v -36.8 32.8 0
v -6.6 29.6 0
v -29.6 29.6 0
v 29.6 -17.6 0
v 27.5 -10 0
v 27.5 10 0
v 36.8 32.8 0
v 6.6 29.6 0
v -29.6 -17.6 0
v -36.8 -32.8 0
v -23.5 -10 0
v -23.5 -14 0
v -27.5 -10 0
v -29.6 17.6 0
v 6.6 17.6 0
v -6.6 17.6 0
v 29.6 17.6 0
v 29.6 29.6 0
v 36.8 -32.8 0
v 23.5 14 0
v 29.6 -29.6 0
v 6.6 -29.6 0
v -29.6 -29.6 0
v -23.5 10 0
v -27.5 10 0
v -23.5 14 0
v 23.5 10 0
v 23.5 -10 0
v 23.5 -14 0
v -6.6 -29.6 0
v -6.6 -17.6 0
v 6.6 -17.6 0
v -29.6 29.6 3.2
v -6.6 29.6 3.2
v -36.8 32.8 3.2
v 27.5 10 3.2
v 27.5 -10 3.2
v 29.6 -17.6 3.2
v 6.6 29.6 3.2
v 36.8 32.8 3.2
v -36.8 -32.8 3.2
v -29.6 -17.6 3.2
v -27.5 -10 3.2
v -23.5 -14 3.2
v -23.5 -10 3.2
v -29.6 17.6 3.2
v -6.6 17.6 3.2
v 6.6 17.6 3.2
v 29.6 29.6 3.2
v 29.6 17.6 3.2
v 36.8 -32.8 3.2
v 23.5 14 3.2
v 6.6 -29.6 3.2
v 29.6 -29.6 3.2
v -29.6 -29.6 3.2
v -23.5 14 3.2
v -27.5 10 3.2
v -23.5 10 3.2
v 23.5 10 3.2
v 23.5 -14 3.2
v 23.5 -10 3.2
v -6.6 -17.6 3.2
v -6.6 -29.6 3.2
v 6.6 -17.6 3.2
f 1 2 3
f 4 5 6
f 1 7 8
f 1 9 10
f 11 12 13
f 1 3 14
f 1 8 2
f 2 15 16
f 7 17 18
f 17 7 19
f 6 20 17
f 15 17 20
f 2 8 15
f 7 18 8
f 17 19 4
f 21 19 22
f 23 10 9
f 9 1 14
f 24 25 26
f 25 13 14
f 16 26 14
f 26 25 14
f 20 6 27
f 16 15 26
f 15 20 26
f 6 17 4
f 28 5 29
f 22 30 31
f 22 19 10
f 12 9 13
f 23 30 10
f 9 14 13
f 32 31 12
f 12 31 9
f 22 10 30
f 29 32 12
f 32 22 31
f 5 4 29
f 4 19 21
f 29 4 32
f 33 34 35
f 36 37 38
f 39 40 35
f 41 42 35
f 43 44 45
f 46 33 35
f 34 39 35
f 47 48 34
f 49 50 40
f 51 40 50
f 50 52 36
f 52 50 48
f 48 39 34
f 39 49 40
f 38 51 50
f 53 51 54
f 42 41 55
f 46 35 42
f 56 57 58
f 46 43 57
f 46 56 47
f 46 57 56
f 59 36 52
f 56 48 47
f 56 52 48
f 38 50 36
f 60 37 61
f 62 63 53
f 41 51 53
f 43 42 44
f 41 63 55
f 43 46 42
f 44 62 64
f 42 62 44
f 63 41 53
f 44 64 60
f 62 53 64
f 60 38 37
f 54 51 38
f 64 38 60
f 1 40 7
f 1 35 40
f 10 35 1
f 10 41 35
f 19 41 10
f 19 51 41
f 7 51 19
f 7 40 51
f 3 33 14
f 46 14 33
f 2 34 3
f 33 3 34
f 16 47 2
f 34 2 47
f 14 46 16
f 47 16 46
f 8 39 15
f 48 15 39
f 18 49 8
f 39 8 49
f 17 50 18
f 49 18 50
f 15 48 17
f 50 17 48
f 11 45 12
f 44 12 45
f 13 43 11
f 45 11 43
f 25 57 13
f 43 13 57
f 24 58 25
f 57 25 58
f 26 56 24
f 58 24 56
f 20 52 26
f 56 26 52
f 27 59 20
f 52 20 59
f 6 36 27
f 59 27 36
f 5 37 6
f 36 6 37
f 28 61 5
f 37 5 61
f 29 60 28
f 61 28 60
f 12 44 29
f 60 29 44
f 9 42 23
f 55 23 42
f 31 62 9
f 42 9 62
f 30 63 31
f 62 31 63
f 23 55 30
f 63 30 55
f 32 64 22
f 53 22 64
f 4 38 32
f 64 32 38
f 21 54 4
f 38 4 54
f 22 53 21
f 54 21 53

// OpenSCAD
// TODO d1 and d2 tangent work properly

$fn=32;

servo_arm_d = 8;
servo_arm_len = 20;
servo_double_arm_len = 36;

servo_len = 23;
servo_width = 12;
servo_bolt_d = 3;
servo_bolt_offset=3;

servo_center_short = 10;
servo_center_long  = 22;

width=3.2;

meat = 2.0;

border_size = 3.2;

b2_len = 150;
b2_d1 = max(30, 2*(servo_center_short+border_size) + 2);
b2_d2 = 20;

b1_len = 150;
b1_d1 = 30;
b1_d2 = b2_d1;

b0_width = servo_center_short + servo_center_long + 3;

b0_support_len = 10;

esp_len = 55;
esp_width = 28;
esp_bolt_d = 3;

function bone_tangents(l, diams) = let (r1 = diams[0]/2, r2 = diams[1]/2, th = acos((r1-r2) / l)) [
    [-l/2 + r1 * cos(th), -r1 * sin(th)],
    [-l/2 + r1 * cos(th), +r1 * sin(th)],
    [+l/2 + r2 * cos(th), +r2 * sin(th)],
    [+l/2 + r2 * cos(th), -r2 * sin(th)],
];

module bone2d(l, diams, triangles=0) difference() {
    points=bone_tangents(l, diams);

    union() {
        polygon(points);
        translate([-l/2, 0]) circle(d=diams[0]);
        translate([+l/2, 0]) circle(d=diams[1]);
    }
    
    if ($children >= 1) translate([-b1_len/2, 0]) children(0);
    if ($children >= 2) translate([+b1_len/2, 0]) children(1);
}

function lerp(p1, p2, a) = p1*(1-a) + p2*a;

function triangles_points(triangles, lines) = [for (i=[0:triangles+1]) lerp(lines[i%2][0], lines[i%2][1], i / (triangles+1))];

module triangles_shadow(triangles, lines) {
    points = triangles_points(triangles, lines);
    
    p1 = points[0];
    p2 = points[1];
    p3 = points[len(points) - 1 - (triangles  )%2];
    p4 = points[len(points) - 1 - (triangles+1)%2];

    if (triangles == 0);
    else if (triangles == 1) polygon(points=[
        lerp(p1, p2, -0.01),
        lerp(p3, p4, -0.01),
        lerp(p1, p2, +1.01),
        lerp(p3, p4, +1.01),
    ]); else polygon(points=[
        lerp(p1, p2, -0.01),
        lerp(p1, p2, +1.01),
        lerp(p3, p4, -0.01),
        lerp(p3, p4, +1.01),
    ]);

}

module anti_triangles(triangles, lines) {
    points = triangles_points(triangles, lines);
        
    lines_th = [for (l=lines) atan2(l[1][1]-l[0][1], l[1][0]-l[0][0])];
        
    lines_vec = [for (th=lines_th) [cos(th), sin(th)]];

    for (i=[0:len(points)-2]) {
        th1 = atan2(points[i+1][1]-points[i][1], points[i+1][0]-points[i][0]) - lines_th[i%2];
        l1 = 1 / sin(th1);

        th2 = atan2(points[i+1][1]-points[i][1], points[i+1][0]-points[i][0]) - lines_th[(i+1)%2];
        l2 = 1 / sin(th2);
        
        polygon(points=[
            points[i]   - lines_vec[i    %2] * l1 * width / 2,
            points[i]   + lines_vec[i    %2] * l1 * width / 2,
            points[i+1] + lines_vec[(i+1)%2] * l2 * width / 2,
            points[i+1] - lines_vec[(i+1)%2] * l2 * width / 2,
        ]);
    }
}

function vec_norm(p) = p / norm(p);

module bone(l, diams, triangles=0, line_paddings=[0, 0]) {
    points = bone_tangents(l, diams);
    
    lines = [
        [
            points[0] + line_paddings[0] * vec_norm(points[3]-points[0]),
            points[3] + line_paddings[1] * vec_norm(points[0]-points[3]),
        ],
        [
            points[1] + line_paddings[0] * vec_norm(points[2]-points[1]),
            points[2] + line_paddings[1] * vec_norm(points[1]-points[2]),
        ],
    ];
    
    linear_extrude(meat) difference() {
        bone2d(l, diams, triangles) { children(0); if ($children == 2) children(1); }
        triangles_shadow(triangles, lines);
    }
    linear_extrude(width) {
        if (triangles > 0) intersection() {
            anti_triangles(triangles, lines);
            bone2d(l, diams);
        }
        difference() {
            bone2d(l, diams);
            bone2d(l, diams - [border_size*2, border_size*2]);
        }
    }
}

module servo_geometric() {
    square([servo_len, servo_width], center=true);
    //translate([+(servo_bolt_offset + servo_len/2), 0]) circle(d=servo_bolt_d);
    //translate([-(servo_bolt_offset + servo_len/2), 0]) circle(d=servo_bolt_d);    
}

module servo() translate([servo_len/2 - servo_width/2, 0]) servo_geometric();

// bone 1
if (false) bone(b1_len, [b1_d1, b1_d2], triangles=6, line_paddings=[servo_arm_len-servo_arm_d/2, servo_arm_len-servo_arm_d/2]) {
    circle(d=servo_arm_d);
    circle(d=servo_arm_d);
}

// bone 2
if (false) bone(b2_len, [b2_d1, b2_d2], triangles=8, line_paddings=[servo_center_long, -b2_d2]) servo();

// body
if (true) linear_extrude(width) {
    difference() {
        r = max(
            (esp_width/2 + border_size + servo_width/2) / sin(45),
            (servo_center_long + border_size/2) / cos(45)
        );
        
        echo("Body radius is", r);
              
        l = 2 * (max(esp_len/2, r * cos(45) + servo_center_short) + border_size);
        w = 2 * (r * sin(45) + servo_width/2 + border_size);
        
        square([l, w], center=true);
        
        square([esp_len, esp_width], center=true);
        
        for(y = [1, -1], x = [1, -1]) scale([x, y]) translate([-cos(45)*r, sin(45)*r]) servo();
    }
    
    x = esp_len/2 - esp_bolt_d/2;
    y = esp_width/2 - esp_bolt_d/2;

    for (x_sign = [-1, 1]) for (y_sign = [-1, 1]) translate([x * x_sign, y * y_sign]) square(esp_bolt_d+2, center=true);
}

// bone 0
if (false) union() {
    translate([servo_arm_d/2, 0, 0]) rotate([90, 0, 0]) linear_extrude(width, center=true) difference() {
        square([b0_width, b1_d1/2+width + servo_width/2]);
        translate([b0_width/2, b1_d1/2+width]) servo_geometric();
    }

    linear_extrude(meat) difference() {
        square([servo_arm_d + width * 2, servo_double_arm_len], center=true);
        circle(d=servo_arm_d);
    }
    
    translate([servo_arm_d/2, 0, 0]) intersection() {
        sphere(b0_support_len);
        translate([0, -1.5*b0_support_len, 0]) cube([b0_support_len, b0_support_len*3, b0_support_len]);
    }
}
